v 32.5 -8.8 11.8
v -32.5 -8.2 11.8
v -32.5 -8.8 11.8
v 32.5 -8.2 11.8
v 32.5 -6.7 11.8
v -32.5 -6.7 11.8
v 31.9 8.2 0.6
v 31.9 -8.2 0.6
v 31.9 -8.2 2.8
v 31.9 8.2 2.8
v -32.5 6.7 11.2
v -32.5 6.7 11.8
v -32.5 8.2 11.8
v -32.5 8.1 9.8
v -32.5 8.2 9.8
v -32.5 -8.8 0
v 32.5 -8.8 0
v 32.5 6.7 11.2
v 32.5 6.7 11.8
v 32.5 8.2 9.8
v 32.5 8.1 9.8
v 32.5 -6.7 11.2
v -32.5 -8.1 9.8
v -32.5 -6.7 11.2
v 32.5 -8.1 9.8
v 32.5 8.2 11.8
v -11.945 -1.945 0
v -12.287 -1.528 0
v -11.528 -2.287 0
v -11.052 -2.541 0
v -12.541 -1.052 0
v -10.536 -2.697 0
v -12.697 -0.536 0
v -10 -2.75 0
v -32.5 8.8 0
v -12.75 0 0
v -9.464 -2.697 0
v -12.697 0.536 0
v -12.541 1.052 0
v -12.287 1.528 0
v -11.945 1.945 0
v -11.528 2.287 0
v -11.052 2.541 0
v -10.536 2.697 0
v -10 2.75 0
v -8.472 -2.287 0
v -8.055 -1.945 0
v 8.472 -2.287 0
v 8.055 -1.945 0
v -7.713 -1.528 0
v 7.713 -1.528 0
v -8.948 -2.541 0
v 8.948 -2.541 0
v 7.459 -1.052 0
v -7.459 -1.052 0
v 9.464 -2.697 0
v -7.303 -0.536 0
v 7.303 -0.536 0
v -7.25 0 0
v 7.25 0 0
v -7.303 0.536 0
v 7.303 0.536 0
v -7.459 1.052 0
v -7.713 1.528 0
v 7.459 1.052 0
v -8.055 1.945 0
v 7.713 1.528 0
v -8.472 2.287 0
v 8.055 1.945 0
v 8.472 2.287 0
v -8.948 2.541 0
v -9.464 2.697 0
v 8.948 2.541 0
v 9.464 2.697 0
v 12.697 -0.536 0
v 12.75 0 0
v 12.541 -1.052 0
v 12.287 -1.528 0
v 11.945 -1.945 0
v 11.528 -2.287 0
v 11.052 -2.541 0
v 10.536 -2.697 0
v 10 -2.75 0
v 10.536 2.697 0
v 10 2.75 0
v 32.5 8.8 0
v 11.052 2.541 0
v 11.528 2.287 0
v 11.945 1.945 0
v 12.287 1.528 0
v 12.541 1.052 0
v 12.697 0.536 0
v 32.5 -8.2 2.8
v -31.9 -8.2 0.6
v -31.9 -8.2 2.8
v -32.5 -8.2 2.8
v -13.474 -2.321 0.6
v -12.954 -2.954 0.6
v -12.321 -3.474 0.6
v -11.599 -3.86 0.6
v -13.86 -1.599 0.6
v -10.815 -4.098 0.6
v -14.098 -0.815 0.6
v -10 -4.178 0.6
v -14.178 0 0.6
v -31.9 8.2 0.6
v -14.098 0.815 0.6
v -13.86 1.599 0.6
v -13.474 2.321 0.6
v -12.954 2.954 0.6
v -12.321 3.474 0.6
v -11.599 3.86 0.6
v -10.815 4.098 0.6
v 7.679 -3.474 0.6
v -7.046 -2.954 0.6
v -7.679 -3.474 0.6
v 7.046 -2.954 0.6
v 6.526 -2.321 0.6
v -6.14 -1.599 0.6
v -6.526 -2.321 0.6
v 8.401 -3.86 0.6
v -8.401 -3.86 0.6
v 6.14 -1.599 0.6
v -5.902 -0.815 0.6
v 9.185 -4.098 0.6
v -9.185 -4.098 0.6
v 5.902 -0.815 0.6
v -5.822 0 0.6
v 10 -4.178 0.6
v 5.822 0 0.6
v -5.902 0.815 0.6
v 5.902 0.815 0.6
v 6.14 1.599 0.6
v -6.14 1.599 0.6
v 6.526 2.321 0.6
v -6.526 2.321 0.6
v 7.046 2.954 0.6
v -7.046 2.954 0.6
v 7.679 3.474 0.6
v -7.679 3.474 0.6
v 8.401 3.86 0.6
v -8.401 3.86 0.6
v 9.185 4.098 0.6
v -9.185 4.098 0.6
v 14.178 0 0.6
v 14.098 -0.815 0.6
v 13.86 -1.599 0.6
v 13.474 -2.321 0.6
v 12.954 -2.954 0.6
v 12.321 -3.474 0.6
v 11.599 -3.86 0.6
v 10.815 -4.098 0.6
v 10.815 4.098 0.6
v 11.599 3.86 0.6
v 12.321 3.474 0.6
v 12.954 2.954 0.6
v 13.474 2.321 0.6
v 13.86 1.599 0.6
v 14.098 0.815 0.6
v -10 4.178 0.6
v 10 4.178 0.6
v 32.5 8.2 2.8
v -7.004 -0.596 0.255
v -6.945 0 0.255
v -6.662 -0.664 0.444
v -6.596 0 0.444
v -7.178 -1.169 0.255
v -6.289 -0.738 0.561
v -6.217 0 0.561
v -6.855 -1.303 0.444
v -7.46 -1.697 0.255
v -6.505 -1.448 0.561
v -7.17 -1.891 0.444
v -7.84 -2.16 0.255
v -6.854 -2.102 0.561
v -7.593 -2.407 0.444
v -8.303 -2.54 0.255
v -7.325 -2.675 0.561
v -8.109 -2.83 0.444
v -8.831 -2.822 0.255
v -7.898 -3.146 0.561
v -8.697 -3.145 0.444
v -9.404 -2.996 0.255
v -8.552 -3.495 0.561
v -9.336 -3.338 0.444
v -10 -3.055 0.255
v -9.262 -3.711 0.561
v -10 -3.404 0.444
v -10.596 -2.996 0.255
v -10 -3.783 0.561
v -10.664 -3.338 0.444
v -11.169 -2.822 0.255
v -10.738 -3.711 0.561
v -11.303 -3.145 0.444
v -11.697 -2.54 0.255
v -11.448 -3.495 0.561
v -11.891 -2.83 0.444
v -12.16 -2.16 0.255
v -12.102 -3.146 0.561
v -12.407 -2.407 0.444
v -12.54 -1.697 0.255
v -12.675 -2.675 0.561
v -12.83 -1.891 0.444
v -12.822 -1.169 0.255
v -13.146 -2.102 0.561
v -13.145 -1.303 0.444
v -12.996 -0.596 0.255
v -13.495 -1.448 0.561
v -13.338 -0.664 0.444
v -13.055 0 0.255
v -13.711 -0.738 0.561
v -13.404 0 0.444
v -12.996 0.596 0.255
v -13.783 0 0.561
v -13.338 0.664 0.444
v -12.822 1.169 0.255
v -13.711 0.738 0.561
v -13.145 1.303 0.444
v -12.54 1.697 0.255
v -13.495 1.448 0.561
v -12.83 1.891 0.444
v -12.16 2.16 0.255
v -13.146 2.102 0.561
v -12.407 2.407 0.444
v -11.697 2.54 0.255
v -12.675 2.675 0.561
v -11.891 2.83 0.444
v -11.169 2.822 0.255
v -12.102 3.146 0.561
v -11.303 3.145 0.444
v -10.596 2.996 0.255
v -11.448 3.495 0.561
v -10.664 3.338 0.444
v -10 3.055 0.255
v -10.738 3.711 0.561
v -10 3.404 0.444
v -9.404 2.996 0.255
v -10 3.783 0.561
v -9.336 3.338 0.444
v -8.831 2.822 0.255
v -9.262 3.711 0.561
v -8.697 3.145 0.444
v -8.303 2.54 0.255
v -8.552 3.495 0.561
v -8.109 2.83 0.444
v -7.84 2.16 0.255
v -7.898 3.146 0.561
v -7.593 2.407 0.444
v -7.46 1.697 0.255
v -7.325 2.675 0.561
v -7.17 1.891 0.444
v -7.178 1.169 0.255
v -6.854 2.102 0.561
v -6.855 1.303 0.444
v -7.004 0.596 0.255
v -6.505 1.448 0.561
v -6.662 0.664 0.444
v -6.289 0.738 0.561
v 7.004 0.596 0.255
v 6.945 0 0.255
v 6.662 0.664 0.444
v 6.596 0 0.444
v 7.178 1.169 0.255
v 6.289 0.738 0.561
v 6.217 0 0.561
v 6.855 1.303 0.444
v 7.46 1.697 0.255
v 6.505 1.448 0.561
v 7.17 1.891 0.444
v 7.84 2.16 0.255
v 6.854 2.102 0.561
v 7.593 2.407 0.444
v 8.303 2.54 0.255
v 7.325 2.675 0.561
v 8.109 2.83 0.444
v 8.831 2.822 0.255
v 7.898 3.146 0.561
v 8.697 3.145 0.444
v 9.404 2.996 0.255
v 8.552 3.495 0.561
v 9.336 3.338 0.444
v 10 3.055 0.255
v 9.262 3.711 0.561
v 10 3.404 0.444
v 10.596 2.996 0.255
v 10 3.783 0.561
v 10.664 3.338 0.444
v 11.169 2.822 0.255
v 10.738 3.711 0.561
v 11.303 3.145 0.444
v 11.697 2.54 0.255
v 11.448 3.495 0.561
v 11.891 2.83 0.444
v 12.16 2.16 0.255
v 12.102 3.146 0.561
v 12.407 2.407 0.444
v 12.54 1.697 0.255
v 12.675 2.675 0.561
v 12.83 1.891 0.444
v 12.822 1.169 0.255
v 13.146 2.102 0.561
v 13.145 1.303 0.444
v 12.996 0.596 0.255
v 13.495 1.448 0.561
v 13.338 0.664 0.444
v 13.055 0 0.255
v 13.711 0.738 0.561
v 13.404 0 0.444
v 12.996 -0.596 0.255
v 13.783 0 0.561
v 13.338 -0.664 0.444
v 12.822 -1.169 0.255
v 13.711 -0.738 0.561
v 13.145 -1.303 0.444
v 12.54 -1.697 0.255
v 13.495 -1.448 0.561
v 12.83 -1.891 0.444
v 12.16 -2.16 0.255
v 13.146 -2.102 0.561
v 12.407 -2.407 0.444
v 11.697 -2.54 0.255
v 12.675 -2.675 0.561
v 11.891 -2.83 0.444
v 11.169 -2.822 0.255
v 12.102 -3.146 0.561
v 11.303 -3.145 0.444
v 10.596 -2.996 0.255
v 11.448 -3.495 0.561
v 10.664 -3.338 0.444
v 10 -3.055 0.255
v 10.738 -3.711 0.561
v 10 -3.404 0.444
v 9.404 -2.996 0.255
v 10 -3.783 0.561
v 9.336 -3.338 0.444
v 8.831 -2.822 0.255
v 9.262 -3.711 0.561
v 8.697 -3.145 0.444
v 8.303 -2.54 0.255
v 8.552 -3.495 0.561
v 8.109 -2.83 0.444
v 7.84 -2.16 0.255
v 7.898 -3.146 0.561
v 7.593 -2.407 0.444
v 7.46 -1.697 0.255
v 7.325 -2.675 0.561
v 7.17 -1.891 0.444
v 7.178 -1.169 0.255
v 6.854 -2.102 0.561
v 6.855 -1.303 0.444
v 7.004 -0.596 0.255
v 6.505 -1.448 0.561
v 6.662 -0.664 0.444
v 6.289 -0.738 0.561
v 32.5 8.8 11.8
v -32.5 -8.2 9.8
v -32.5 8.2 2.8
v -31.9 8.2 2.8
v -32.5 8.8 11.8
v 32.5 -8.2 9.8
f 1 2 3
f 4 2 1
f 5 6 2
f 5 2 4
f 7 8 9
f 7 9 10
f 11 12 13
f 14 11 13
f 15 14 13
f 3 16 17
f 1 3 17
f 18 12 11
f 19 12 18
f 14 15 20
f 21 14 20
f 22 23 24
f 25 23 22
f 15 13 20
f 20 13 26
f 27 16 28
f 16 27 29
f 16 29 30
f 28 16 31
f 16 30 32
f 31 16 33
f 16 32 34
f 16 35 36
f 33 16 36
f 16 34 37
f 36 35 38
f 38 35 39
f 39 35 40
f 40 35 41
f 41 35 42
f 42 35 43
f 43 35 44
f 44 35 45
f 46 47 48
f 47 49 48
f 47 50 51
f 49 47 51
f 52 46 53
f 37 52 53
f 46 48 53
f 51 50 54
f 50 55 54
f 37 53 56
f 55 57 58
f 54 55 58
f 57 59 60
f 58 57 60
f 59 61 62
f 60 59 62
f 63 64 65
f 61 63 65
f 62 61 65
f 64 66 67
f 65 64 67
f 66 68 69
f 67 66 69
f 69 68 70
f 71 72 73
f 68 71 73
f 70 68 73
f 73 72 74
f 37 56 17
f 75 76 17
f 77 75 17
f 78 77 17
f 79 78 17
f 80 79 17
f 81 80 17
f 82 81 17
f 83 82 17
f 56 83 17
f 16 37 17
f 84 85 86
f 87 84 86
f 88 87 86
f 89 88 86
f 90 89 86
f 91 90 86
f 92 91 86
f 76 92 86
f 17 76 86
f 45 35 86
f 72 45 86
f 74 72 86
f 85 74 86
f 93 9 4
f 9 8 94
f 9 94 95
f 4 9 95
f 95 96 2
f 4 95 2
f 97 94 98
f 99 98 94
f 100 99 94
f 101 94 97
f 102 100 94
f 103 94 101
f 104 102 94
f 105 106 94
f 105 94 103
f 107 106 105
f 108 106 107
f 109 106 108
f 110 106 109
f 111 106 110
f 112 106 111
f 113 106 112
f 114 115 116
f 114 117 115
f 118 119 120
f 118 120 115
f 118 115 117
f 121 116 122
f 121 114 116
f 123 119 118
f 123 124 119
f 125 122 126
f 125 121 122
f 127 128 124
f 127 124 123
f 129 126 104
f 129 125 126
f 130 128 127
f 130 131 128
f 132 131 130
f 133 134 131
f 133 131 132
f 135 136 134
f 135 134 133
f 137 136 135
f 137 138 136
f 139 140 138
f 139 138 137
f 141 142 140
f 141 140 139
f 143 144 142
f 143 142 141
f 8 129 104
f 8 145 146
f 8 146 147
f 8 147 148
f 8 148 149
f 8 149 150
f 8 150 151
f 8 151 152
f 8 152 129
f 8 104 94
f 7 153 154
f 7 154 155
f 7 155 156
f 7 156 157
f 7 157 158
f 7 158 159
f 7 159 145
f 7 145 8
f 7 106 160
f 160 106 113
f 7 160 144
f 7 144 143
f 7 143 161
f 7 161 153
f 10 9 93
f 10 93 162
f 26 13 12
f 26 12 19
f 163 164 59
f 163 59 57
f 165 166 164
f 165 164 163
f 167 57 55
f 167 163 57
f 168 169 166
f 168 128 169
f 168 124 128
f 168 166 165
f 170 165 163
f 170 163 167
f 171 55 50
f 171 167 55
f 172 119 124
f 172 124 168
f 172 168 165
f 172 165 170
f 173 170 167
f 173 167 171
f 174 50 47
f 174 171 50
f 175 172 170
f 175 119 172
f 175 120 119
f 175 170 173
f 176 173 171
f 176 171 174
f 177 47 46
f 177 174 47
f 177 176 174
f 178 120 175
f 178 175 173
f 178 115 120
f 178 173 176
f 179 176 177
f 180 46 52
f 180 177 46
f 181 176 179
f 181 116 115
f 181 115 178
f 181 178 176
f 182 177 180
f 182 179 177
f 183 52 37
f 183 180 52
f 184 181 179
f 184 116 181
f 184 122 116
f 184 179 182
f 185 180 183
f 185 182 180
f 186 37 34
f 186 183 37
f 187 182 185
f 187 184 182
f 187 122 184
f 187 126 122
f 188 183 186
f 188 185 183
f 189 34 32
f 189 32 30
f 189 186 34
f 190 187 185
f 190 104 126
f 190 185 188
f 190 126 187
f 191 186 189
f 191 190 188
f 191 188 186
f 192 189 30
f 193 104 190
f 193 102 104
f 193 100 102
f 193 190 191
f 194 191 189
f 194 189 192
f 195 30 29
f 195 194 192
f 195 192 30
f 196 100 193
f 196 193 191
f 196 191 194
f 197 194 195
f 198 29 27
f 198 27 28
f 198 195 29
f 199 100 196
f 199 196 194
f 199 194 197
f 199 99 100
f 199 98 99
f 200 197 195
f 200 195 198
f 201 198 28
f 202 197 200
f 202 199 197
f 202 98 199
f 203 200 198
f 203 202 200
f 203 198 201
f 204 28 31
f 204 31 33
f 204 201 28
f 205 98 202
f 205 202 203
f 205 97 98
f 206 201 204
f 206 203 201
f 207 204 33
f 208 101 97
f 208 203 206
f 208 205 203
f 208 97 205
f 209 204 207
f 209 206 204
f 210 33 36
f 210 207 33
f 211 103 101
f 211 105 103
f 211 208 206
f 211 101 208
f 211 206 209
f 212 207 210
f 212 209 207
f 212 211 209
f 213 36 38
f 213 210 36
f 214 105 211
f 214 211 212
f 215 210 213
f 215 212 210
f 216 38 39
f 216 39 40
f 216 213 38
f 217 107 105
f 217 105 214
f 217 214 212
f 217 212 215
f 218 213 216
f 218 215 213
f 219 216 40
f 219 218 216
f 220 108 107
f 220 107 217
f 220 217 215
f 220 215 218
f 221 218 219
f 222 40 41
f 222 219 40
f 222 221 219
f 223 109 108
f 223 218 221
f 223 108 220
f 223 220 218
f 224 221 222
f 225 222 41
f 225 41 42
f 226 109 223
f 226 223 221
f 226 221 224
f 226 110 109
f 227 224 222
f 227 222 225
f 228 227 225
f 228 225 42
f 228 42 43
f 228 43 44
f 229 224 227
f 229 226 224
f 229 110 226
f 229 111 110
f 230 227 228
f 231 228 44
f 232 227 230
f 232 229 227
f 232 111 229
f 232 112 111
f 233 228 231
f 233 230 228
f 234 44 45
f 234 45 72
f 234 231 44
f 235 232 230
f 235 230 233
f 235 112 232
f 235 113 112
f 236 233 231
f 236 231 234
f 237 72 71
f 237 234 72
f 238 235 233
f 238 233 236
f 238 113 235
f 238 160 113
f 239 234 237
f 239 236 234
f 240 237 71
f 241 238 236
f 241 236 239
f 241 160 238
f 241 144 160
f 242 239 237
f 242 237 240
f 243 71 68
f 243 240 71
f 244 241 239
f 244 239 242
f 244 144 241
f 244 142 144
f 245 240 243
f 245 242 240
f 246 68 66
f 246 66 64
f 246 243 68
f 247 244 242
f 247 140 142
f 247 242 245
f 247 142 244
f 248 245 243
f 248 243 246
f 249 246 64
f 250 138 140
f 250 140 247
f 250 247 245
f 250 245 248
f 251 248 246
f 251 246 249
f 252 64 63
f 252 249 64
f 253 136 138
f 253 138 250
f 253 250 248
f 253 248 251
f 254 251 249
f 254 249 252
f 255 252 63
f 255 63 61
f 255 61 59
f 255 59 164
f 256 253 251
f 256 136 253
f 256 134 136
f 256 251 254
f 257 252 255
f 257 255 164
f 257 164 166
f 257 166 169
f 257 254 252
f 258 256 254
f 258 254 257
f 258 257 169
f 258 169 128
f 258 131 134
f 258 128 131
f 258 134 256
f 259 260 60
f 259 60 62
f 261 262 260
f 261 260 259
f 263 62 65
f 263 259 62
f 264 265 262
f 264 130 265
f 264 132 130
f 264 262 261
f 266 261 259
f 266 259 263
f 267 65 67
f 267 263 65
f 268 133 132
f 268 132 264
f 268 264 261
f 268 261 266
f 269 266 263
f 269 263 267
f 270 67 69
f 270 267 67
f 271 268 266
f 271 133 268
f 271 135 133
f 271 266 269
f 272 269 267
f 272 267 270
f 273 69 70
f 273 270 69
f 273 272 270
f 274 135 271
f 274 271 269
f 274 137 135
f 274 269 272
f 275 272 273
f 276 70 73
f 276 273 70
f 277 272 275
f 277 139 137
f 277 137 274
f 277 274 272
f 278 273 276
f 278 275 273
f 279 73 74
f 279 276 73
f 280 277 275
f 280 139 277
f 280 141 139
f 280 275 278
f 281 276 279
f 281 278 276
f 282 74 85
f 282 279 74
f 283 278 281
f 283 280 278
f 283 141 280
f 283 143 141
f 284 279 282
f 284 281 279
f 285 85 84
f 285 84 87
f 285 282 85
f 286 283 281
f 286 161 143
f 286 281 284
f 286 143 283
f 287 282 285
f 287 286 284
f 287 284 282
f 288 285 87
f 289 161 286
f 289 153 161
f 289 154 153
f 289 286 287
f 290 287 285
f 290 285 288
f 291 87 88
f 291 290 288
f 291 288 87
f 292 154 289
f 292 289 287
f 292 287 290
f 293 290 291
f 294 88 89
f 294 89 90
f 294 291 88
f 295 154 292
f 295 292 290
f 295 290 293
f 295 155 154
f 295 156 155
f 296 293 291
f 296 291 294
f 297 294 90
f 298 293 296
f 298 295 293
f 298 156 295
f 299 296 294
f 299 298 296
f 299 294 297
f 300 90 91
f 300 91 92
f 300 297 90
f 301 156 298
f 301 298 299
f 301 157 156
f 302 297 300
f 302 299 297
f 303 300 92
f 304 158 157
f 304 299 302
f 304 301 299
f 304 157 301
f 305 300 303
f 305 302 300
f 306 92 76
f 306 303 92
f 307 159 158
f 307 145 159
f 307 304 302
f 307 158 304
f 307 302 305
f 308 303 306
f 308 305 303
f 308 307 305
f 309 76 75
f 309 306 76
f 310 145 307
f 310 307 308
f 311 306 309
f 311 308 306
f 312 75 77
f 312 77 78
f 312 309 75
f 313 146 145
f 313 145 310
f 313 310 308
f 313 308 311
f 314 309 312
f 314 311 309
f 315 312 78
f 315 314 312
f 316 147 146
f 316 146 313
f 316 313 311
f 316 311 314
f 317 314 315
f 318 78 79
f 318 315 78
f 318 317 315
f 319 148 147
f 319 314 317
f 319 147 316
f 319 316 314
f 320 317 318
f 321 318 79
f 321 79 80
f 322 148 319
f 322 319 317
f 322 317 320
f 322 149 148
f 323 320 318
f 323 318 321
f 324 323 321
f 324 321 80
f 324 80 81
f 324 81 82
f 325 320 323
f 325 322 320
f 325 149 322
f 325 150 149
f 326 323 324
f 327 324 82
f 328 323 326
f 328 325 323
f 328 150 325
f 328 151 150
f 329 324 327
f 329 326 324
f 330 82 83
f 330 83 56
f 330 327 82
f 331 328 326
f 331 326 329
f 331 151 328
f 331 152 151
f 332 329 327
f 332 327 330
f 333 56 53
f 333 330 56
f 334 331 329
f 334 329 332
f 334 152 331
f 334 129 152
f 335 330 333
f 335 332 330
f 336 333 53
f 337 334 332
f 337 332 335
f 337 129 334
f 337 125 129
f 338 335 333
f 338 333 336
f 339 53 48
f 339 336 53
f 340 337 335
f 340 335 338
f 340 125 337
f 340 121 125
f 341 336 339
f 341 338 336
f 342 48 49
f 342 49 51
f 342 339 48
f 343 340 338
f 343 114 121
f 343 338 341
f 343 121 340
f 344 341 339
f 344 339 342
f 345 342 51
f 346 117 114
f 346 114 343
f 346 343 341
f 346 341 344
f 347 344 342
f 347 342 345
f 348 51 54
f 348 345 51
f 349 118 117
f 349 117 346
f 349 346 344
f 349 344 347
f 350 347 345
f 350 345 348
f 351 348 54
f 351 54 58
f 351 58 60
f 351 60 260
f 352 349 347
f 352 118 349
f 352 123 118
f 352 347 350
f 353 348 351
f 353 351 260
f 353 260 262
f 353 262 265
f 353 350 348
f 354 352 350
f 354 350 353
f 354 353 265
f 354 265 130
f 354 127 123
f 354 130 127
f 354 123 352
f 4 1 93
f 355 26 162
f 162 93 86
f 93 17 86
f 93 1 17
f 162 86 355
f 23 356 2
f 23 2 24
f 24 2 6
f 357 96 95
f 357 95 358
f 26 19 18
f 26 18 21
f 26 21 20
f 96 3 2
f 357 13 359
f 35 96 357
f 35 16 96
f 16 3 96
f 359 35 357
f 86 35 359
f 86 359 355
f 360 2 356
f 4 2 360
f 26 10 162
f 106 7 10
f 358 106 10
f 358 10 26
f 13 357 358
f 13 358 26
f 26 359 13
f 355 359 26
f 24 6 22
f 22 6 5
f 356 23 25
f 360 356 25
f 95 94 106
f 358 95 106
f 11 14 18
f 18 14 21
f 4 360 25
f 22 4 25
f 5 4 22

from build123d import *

# Parameters (mm, degrees)
SKETCH1_W             = 65
SKETCH1_H             = 17.6
BOSS_EXTRUDE1_DEPTH   = 11.8
SHELL1_T              = -0.6
SKETCH2_W             = 9
SKETCH2_H             = 16.4
CUT_EXTRUDE1_DEPTH    = 67.645930108
SKETCH3_W             = 65
SKETCH3_H             = 1.5
BOSS_EXTRUDE2_DEPTH   = 2
BOSS_EXTRUDE2_2_DEPTH = 2
CHAMFER1_SIZE         = 1.4
CHAMFER2_SIZE         = 1.4
SKETCH4_R             = 2.75
CUT_EXTRUDE2_DEPTH    = 3
FILLET2_R             = 2


with BuildPart() as part:
    # Sketch1 → Boss-Extrude1 (new body)
    with BuildSketch(Plane.XY):
        Rectangle(SKETCH1_W, SKETCH1_H)
    extrude(amount=BOSS_EXTRUDE1_DEPTH)

    # Shell1
    shell1_openings = [part.faces().sort_by_distance(p)[0] for p in [
        (0, 0, 11.8),
    ]]
    offset(amount=SHELL1_T, openings=shell1_openings, kind=Kind.INTERSECTION)

    # Sketch2 → Cut-Extrude1 (cut, through all)
    with BuildSketch(Plane.ZY.offset(32.5)):
        with Locations((7.3, 0)):
            Rectangle(SKETCH2_W, SKETCH2_H)
    extrude(amount=-CUT_EXTRUDE1_DEPTH, mode=Mode.SUBTRACT)

    # Sketch4 → Cut-Extrude2 (cut)
    with BuildSketch(Plane(origin=(0, 0, 0), x_dir=(-1, 0, 0), z_dir=(0, 0, -1))):
        with Locations((-10, 0)):
            Circle(SKETCH4_R)
        with Locations(Location((10, 0, 0), (0, 0, 180))):
            Circle(SKETCH4_R)
    extrude(amount=-CUT_EXTRUDE2_DEPTH, mode=Mode.SUBTRACT)

    # Fillet2
    # the kernel refuses this fillet: 2 mm, written as the material it takes off along each edge
    with BuildSketch(Plane(origin=(10, 0, 0.6), x_dir=(-1, 0, 0), z_dir=(0, -1, 0))) as fillet2_piece_1:
        with BuildLine():
            CenterArc((4.178285686, 2), FILLET2_R, 224.427004001, 45.572995999)
            Line((4.178285686, 0), (4.178285686, -0.04))
            Line((4.178285686, -0.04), (2.75, -0.04))
            Line((2.75, -0.04), (2.71, 0))
            ThreePointArc((2.71, 0), (2.71, 0.3), (2.721434286, 0.572))
            Line((2.721434286, 0.572), (2.75, 0.6))
        make_face()
    revolve(axis=Axis((10, 0, 0.6), (0, 0, -1)), mode=Mode.SUBTRACT)
    with BuildSketch(Plane(origin=(-10, 0, 0.6), x_dir=(1, 0, 0), z_dir=(0, 1, 0))) as fillet2_piece_2:
        with BuildLine():
            CenterArc((4.178285686, 2), FILLET2_R, 224.427004001, 45.572995999)
            Line((4.178285686, 0), (4.178285686, -0.04))
            Line((4.178285686, -0.04), (2.75, -0.04))
            Line((2.75, -0.04), (2.71, 0))
            ThreePointArc((2.71, 0), (2.71, 0.3), (2.721434286, 0.572))
            Line((2.721434286, 0.572), (2.75, 0.6))
        make_face()
    revolve(axis=Axis((-10, 0, 0.6), (0, 0, -1)), mode=Mode.SUBTRACT)


with BuildPart() as body_2:
    # Sketch3 → Boss-Extrude2 (new body)
    with BuildSketch(Plane.XY.offset(11.8)):
        with Locations((0, 7.45)):
            Rectangle(SKETCH3_W, SKETCH3_H)
    extrude(amount=-BOSS_EXTRUDE2_DEPTH)

    # Chamfer1
    chamfer1_edges = [body_2.edges().sort_by_distance(p)[0] for p in [
        (0, 6.7, 9.8),
    ]]
    chamfer(chamfer1_edges, length=CHAMFER1_SIZE)


with BuildPart() as body_3:
    # Sketch3 → Boss-Extrude2 2 (new body)
    with BuildSketch(Plane.XY.offset(11.8)):
        with Locations((0, -7.45)):
            Rectangle(SKETCH3_W, SKETCH3_H)
    extrude(amount=-BOSS_EXTRUDE2_2_DEPTH)

    # Chamfer2
    chamfer2_edges = [body_3.edges().sort_by_distance(p)[0] for p in [
        (0, -6.7, 9.8),
    ]]
    chamfer(chamfer2_edges, length=CHAMFER2_SIZE)


solid = Compound([part.part, body_2.part, body_3.part])
